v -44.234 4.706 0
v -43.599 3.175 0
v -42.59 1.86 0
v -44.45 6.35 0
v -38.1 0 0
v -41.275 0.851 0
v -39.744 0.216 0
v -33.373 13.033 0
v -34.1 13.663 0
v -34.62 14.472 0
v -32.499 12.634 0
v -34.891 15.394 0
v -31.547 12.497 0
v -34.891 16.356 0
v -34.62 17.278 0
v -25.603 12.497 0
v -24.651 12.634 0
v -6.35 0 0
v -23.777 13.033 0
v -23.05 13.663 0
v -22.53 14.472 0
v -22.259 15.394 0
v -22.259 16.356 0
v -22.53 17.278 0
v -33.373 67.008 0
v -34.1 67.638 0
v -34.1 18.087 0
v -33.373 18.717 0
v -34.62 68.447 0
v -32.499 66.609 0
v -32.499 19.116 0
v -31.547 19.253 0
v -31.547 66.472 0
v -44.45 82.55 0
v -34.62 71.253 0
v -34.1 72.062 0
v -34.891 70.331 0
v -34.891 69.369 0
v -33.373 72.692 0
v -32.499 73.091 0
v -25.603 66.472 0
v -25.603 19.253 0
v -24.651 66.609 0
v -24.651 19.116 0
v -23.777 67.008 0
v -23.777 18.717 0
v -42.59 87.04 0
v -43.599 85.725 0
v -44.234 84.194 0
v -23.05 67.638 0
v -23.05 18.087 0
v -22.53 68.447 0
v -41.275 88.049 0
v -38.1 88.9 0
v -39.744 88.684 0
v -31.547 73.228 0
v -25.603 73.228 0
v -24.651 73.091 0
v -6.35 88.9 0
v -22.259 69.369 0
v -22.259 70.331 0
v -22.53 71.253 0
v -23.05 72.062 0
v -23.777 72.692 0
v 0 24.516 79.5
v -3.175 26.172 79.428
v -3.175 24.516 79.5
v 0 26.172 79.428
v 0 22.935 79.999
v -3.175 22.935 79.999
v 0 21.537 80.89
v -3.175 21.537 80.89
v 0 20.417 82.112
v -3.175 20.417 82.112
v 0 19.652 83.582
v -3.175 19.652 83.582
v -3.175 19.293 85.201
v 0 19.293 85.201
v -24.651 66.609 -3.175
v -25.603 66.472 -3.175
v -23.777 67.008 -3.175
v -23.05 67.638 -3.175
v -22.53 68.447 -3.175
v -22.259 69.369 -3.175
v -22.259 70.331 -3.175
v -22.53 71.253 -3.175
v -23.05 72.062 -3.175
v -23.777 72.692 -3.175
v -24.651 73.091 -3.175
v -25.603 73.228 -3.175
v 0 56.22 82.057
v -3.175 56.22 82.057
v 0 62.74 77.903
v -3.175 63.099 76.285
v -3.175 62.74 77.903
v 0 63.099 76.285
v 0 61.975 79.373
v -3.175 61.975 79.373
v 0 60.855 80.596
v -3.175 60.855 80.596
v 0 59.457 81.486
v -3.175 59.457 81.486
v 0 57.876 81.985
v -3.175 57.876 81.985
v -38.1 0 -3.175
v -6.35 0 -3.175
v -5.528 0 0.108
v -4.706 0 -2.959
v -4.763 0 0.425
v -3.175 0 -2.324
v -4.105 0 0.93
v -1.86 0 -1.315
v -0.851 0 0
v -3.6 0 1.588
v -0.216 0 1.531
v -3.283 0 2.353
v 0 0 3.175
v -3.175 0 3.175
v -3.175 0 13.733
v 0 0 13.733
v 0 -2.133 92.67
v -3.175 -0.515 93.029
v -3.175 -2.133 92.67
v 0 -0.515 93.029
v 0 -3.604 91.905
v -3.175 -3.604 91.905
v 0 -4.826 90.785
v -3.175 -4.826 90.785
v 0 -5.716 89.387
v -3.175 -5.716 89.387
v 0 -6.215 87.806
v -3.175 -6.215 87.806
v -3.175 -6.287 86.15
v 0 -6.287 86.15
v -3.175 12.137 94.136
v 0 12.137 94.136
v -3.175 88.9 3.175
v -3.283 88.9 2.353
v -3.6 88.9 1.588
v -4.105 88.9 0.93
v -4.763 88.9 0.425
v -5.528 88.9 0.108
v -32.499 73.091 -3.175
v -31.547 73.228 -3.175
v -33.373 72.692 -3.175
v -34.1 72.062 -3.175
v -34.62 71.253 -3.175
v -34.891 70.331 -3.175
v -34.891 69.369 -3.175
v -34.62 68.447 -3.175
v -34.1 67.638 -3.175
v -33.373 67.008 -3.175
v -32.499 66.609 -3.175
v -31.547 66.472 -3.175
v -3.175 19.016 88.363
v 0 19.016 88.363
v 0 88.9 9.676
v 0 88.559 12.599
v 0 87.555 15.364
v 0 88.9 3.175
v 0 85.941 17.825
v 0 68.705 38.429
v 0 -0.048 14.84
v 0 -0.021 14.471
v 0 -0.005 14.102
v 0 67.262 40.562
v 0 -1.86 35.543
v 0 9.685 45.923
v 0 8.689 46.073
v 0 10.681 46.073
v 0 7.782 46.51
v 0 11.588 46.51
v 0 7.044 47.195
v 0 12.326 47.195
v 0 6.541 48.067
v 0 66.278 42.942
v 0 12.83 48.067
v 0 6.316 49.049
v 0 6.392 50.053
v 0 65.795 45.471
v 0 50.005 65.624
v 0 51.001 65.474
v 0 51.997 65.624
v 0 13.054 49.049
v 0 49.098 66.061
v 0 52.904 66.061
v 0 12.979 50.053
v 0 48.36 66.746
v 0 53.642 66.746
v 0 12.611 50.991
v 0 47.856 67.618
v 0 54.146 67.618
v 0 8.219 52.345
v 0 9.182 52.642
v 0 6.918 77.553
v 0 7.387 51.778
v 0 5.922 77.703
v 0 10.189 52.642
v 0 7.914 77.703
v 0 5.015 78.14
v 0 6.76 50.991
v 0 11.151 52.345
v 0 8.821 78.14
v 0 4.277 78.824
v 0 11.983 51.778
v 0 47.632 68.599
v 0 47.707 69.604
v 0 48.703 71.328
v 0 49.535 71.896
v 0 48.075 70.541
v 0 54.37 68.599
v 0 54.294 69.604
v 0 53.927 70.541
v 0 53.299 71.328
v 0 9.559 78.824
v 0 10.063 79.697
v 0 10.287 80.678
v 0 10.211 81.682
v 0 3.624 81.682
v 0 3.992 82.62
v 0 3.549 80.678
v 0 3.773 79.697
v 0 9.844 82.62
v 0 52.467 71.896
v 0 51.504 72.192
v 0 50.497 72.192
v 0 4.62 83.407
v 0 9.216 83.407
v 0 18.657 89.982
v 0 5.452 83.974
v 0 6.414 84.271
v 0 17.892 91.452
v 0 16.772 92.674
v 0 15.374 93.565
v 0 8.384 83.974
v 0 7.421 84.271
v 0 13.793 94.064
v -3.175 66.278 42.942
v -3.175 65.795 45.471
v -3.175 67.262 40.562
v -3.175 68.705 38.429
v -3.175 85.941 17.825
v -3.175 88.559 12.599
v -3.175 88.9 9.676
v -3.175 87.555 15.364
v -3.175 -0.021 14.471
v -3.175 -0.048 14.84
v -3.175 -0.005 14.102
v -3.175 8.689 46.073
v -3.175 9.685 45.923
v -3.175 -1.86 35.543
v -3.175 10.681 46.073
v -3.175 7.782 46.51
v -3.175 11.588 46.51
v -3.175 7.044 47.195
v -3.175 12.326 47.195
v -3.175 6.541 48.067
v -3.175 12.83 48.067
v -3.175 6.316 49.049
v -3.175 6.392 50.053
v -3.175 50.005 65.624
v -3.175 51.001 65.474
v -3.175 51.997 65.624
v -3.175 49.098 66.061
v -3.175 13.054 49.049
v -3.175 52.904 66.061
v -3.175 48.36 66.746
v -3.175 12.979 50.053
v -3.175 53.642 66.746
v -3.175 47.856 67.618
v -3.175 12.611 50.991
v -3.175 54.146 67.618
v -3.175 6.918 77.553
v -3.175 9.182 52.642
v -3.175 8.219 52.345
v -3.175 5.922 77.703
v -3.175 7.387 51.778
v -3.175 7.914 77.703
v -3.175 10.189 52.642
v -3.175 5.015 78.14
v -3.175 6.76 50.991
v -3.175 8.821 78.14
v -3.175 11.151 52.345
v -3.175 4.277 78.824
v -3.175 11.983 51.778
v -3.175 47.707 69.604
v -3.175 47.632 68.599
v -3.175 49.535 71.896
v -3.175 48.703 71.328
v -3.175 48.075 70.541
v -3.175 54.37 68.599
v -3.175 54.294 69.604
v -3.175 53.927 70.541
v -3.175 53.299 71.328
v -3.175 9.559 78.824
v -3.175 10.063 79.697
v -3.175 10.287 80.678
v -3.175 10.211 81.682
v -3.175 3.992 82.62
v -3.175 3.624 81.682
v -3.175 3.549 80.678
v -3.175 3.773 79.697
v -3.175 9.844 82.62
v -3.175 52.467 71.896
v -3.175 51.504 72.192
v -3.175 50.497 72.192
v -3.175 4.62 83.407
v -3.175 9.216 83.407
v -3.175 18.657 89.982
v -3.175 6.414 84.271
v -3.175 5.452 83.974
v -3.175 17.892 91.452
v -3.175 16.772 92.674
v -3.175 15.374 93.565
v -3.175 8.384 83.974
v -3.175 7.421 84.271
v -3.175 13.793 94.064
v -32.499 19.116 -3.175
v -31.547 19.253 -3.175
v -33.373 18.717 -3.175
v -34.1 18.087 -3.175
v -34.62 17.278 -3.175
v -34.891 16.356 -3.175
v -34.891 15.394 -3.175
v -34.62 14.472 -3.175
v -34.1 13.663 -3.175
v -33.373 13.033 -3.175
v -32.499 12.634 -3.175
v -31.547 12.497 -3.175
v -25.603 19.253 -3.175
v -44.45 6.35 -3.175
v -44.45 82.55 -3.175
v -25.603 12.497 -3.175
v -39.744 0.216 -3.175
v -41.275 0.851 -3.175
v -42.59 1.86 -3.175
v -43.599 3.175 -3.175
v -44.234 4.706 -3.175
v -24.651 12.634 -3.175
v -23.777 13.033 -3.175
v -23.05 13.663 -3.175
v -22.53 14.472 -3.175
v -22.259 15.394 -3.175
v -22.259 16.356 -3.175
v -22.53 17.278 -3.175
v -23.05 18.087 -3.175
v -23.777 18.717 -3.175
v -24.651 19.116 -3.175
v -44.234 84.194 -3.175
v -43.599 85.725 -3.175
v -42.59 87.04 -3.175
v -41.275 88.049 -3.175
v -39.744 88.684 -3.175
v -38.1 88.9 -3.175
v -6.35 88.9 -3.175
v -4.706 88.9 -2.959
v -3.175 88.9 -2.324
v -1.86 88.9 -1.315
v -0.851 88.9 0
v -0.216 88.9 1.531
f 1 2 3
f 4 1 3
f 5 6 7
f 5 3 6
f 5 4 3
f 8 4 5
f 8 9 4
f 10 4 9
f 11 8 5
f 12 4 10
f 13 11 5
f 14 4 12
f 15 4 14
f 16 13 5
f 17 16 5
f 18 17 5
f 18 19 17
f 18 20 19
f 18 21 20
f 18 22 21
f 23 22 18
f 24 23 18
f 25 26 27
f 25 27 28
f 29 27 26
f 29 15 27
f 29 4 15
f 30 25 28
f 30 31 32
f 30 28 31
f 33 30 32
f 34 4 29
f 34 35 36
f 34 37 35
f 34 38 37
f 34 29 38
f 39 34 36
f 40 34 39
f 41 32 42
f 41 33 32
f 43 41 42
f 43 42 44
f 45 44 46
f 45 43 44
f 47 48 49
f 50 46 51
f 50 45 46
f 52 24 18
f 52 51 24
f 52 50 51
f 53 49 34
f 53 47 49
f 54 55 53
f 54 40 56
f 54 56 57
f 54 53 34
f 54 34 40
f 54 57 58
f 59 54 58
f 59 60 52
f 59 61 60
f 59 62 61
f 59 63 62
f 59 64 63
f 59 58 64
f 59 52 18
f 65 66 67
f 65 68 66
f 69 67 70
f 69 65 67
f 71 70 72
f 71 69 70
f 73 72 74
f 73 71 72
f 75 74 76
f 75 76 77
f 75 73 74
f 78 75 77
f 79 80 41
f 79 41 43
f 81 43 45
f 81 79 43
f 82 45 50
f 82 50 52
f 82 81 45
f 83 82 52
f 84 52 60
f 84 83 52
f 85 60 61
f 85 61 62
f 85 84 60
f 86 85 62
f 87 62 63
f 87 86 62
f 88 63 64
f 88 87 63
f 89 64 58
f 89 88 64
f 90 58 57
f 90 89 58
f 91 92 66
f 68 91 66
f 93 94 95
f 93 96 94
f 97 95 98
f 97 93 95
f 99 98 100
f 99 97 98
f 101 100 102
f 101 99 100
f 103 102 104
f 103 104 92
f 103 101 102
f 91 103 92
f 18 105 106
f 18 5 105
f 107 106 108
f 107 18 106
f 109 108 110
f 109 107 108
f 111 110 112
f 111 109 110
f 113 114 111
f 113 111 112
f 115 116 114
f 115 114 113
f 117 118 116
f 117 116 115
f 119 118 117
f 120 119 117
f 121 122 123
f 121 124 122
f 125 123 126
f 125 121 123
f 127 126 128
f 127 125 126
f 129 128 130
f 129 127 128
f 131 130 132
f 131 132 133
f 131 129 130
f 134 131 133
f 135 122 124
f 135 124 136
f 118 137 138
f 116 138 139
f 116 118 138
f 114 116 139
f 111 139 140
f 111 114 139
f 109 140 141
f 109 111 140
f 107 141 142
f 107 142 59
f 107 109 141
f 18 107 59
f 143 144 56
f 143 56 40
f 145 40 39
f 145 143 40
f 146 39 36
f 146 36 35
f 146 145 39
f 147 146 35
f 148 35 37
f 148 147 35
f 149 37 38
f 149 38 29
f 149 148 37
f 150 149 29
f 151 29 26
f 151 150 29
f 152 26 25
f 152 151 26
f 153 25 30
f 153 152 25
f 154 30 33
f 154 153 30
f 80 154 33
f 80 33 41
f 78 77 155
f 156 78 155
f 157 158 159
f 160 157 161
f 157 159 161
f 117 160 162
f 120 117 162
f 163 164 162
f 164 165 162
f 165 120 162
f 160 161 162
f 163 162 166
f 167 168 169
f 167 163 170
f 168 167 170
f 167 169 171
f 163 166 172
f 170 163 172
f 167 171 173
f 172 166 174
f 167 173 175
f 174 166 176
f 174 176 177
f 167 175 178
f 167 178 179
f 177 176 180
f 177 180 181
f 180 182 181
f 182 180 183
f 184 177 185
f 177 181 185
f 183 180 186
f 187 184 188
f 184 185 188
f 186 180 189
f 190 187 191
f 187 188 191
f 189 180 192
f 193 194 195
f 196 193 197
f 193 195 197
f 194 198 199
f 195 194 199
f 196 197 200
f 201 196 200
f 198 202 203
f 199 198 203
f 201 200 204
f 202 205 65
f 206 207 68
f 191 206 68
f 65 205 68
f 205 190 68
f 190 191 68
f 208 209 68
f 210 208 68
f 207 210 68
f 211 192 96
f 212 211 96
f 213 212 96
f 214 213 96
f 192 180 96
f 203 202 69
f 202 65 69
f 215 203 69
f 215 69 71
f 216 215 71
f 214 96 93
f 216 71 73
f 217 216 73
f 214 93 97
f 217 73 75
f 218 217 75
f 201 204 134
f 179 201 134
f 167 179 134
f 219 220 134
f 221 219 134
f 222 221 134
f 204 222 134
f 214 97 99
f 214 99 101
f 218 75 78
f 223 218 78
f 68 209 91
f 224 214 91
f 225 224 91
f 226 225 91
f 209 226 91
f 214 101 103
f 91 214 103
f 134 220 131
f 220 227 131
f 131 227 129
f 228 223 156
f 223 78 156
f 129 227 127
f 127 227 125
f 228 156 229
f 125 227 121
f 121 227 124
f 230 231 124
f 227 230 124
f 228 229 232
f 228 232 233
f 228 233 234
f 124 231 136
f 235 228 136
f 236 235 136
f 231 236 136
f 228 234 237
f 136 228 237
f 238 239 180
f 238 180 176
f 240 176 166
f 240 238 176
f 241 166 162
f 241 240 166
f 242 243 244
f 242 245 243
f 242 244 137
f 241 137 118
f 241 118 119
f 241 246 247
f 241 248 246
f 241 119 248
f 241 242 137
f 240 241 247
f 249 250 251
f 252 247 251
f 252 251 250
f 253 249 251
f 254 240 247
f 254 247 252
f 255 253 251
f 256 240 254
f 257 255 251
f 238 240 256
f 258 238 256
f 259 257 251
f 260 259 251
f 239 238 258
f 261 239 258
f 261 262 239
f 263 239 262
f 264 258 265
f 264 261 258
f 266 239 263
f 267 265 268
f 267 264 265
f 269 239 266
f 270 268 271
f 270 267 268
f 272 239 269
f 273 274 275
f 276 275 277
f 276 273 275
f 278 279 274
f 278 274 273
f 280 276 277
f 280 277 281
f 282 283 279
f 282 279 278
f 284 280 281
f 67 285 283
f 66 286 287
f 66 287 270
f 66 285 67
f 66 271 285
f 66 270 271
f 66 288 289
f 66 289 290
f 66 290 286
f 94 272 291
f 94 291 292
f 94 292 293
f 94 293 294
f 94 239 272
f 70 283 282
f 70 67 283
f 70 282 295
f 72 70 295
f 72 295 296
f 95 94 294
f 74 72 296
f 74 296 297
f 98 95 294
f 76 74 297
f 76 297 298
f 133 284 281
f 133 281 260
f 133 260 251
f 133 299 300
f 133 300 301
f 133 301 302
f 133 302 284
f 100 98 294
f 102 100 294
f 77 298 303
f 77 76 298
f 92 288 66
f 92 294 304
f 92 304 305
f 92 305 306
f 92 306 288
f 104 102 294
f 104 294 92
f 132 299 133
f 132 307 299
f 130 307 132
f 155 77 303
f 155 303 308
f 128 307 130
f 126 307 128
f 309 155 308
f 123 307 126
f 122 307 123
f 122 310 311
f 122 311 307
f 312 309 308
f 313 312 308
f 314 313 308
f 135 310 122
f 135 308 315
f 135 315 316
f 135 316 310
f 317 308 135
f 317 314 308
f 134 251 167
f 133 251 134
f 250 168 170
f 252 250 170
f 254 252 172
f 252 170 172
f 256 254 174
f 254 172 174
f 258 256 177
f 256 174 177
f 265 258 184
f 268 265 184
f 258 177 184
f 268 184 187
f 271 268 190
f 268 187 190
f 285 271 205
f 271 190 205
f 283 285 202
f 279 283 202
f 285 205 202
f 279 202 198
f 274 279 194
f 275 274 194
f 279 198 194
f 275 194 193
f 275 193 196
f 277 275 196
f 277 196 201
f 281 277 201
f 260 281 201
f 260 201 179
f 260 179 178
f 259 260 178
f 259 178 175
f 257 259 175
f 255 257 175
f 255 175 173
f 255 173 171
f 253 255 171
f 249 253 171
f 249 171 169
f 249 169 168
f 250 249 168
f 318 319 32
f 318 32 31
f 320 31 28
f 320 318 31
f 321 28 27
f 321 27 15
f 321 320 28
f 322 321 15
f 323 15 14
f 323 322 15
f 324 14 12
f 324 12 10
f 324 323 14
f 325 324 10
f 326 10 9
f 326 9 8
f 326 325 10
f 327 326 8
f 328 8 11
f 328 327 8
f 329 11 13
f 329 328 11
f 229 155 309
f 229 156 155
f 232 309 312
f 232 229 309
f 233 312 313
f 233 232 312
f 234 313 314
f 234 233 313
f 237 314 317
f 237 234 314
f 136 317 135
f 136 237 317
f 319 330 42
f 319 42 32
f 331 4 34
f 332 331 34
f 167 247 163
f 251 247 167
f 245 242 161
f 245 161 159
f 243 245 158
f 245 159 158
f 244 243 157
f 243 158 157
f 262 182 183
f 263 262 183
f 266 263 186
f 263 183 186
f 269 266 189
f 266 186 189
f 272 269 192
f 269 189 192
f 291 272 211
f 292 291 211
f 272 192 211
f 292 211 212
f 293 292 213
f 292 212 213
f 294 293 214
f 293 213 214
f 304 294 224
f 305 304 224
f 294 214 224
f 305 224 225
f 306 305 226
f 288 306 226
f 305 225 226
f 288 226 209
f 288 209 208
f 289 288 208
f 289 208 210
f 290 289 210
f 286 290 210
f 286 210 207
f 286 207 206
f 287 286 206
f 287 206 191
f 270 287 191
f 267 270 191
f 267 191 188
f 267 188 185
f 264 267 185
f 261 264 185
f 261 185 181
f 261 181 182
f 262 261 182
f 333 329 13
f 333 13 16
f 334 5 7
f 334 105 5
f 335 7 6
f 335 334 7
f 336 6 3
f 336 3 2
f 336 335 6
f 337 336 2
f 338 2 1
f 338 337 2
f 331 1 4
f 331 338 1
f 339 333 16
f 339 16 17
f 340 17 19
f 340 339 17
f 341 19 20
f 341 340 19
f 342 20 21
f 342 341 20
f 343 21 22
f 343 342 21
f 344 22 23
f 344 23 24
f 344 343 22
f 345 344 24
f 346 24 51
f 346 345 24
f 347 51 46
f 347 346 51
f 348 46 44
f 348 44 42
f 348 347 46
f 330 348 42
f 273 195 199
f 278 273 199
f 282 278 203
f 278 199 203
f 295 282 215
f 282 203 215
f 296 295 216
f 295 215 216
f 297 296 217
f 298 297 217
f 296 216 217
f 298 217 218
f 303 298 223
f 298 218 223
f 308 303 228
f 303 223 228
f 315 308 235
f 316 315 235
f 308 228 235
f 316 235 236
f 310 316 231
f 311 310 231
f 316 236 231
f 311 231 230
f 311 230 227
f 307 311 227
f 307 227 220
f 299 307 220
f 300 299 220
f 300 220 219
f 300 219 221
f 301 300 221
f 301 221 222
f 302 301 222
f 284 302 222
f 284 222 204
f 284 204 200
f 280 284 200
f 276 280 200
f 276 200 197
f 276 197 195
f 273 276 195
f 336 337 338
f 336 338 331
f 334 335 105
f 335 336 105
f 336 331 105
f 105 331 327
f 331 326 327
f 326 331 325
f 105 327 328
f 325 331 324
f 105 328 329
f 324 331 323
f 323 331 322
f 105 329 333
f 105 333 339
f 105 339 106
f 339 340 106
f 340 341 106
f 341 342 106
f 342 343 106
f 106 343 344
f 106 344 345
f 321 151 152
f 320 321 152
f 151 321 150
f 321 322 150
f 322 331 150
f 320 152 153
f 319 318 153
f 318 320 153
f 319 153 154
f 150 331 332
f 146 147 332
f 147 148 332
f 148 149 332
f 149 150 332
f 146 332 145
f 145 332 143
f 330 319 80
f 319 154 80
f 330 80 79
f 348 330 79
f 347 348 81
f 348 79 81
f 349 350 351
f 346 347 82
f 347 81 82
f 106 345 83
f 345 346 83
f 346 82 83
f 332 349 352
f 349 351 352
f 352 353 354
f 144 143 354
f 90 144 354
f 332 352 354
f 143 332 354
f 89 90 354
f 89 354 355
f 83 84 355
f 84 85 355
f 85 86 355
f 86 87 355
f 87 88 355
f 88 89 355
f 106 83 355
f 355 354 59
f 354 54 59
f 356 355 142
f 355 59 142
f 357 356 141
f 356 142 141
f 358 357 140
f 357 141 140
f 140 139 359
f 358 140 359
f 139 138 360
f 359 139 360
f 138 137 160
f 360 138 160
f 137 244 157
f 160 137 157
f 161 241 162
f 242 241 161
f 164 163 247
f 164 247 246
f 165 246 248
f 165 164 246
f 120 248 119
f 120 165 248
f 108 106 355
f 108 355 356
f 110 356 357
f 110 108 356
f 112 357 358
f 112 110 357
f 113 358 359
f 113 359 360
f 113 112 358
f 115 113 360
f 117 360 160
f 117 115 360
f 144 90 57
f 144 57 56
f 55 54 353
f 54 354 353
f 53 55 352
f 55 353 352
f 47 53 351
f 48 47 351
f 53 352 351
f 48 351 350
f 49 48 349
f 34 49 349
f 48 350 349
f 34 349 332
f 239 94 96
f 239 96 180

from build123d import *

# Parameters (mm, degrees)
SKETCH1_W                    = 44.45
SKETCH1_H                    = 88.9
BASE_FLANGE1_DEPTH           = 3.175
EDGE_FLANGE1_STRIP_W         = 19.05
EDGE_FLANGE1_STRIP_H         = 3.175
EDGE_FLANGE1_STRIP_CUT_DEPTH = 88.9
EDGE_FLANGE1_DEPTH           = 88.9
BOSS_EXTRUDE1_DEPTH          = 3.175
F_1_4_START                  = -3.175
F_1_4_CLEARANCE_SLOT1_DEPTH  = 3.175
F_1_4_CLEARANCE_HOLE1_D      = 6.7564
CUT_EXTRUDE1_DEPTH           = 139.903982124
FILLET1_R                    = 12.7
FILLET2_R                    = 6.35


# Read off the part's stored shape, not the designer's step: 1/4 Clearance Slot1
# Sheet-metal steps are written as plain solids
with BuildPart() as part:
    # Sketch1 → Base-Flange1 (new body)
    with BuildSketch(Plane.XY):
        with Locations((-22.225, 44.45)):
            Rectangle(SKETCH1_W, SKETCH1_H)
    extrude(amount=-BASE_FLANGE1_DEPTH)

    # Edge-Flange1 strip (across the edge) → Edge-Flange1 strip cut (cut)
    with BuildSketch(Plane(origin=(0, 0, 0), x_dir=(-1, 0, 0), z_dir=(0, 1, 0))):
        with Locations((-3.175, -1.5875)):
            Rectangle(EDGE_FLANGE1_STRIP_W, EDGE_FLANGE1_STRIP_H)
    extrude(amount=EDGE_FLANGE1_STRIP_CUT_DEPTH, mode=Mode.SUBTRACT)

    # Edge-Flange1 section (across the edge) → Edge-Flange1 (add)
    with BuildSketch(Plane(origin=(0, 0, 0), x_dir=(-1, 0, 0), z_dir=(0, 1, 0))):
        with BuildLine():
            Line((0, 3.175), (0, 14.2875))
            Line((0, 14.2875), (3.175, 14.2875))
            Line((3.175, 14.2875), (3.175, 3.175))
            ThreePointArc((3.175, 3.175), (4.10493597, 0.92993597), (6.35, 0))
            Line((6.35, 0), (6.35, -3.175))
            ThreePointArc((6.35, -3.175), (1.859871939, -1.315128061), (0, 3.175))
        make_face()
    extrude(amount=EDGE_FLANGE1_DEPTH)

    # Sketch9 → Boss-Extrude1 (add)
    with BuildSketch(Plane.ZY.offset(3.175)):
        Polygon((35.543004115, -1.859615648), (92.475531111, -6.840566346), (98.425, 61.162174233), (41.492473004, 66.143124931), (14.2875, 88.9), (14.2875, 0), align=None)
    extrude(amount=-BOSS_EXTRUDE1_DEPTH)

    # 1/4 Clearance Slot1 outline → 1/4 Clearance Slot1 (cut)
    with BuildSketch(Plane.XY.offset(F_1_4_START)):
        with BuildLine():
            Line((-31.5468, 12.4968), (-25.6032, 12.4968))
            ThreePointArc((-25.6032, 12.4968), (-22.225, 15.875), (-25.6032, 19.2532))
            Line((-25.6032, 19.2532), (-31.5468, 19.2532))
            ThreePointArc((-31.5468, 19.2532), (-34.925, 15.875), (-31.5468, 12.4968))
        make_face()
        with BuildLine():
            Line((-31.5468, 66.4718), (-25.6032, 66.4718))
            ThreePointArc((-25.6032, 66.4718), (-22.225, 69.85), (-25.6032, 73.2282))
            Line((-25.6032, 73.2282), (-31.5468, 73.2282))
            ThreePointArc((-31.5468, 73.2282), (-34.925, 69.85), (-31.5468, 66.4718))
        make_face()
    extrude(amount=F_1_4_CLEARANCE_SLOT1_DEPTH, mode=Mode.SUBTRACT)

    # 1/4 Clearance Hole1 (through all)
    with Locations(Plane.ZY.offset(3.175)):
        with Locations((68.851858569, 51.000976916), (49.301554713, 9.685179085), (80.930736378, 6.917984253)):
            Hole(F_1_4_CLEARANCE_HOLE1_D / 2)

    # Sketch16 → Cut-Extrude1 (cut, through all)
    with BuildSketch(Plane.ZY.offset(3.175)):
        Polygon((82.610409168, 62.545771649), (78.874696144, 19.846376402), (94.689286976, 18.462778986), (98.425, 61.162174233), align=None)
    extrude(amount=-CUT_EXTRUDE1_DEPTH, mode=Mode.SUBTRACT)

    # Fillet1
    # the kernel refuses this fillet: 12.7 mm, written as the material it adds along each edge
    with BuildSketch(Plane(origin=(0, 0, 14.2875), x_dir=(0, 0, -1), z_dir=(-1, 0, 0))) as fillet1_piece_1:
        with BuildLine():
            CenterArc((FILLET1_R * 0.0436609429085, FILLET1_R), FILLET1_R, 265, 5)
            Line((-FILLET1_R * 0.0434947998391, FILLET1_R * 0.00380530190825), (0, 0))
            Line((0, 0), (FILLET1_R * 0.0436609429085, 0))
        make_face()
    extrude(amount=3.175)
    with BuildSketch(Plane(origin=(-3.175, 66.143124931, 41.492473004), x_dir=(-2.6754118461414173e-15, 0.6416153350460713, -0.7670265717911718), z_dir=(1, 0, 0))) as fillet1_piece_2:
        with BuildLine():
            CenterArc((FILLET1_R * 0.314458316587, FILLET1_R), FILLET1_R, 235.087623307, 34.912376693)
            Line((-FILLET1_R * 0.257864707828, FILLET1_R * 0.179971734802), (0, 0))
            Line((0, 0), (FILLET1_R * 0.314458316587, 0))
        make_face()
    extrude(amount=3.175)
    # the kernel refuses this fillet: 12.7 mm, written as the material it takes off along each edge
    with BuildSketch(Plane(origin=(11.528568508, 88.9, 14.2875), x_dir=(0, 0, -1), z_dir=(-1, 0, 0))) as fillet1_2_piece_1:
        with BuildLine():
            CenterArc((FILLET1_R * 0.363104519926, FILLET1_R), FILLET1_R, 230.087623307, 39.912376693)
            Line((-FILLET1_R * 0.27851081512, FILLET1_R * 0.232973428209), (0, 0))
            Line((0, 0), (FILLET1_R * 0.363104519926, 0))
        make_face()
    extrude(amount=26.232137015, mode=Mode.SUBTRACT)

    # Fillet2
    fillet2_edges = [part.edges().sort_by_distance(p)[0] for p in [
        (-1.5875, 18.462778986, 94.689286976),
        (-1.5875, 62.545771649, 82.610409168),
        (-1.5875, 19.846376402, 78.874696144),
        (-1.5875, -6.840566346, 92.475531111),
        (-44.45, 88.9, -1.5875),
        (-44.45, 0, -1.5875),
    ]]
    fillet(fillet2_edges, radius=FILLET2_R)


solid = part.part
